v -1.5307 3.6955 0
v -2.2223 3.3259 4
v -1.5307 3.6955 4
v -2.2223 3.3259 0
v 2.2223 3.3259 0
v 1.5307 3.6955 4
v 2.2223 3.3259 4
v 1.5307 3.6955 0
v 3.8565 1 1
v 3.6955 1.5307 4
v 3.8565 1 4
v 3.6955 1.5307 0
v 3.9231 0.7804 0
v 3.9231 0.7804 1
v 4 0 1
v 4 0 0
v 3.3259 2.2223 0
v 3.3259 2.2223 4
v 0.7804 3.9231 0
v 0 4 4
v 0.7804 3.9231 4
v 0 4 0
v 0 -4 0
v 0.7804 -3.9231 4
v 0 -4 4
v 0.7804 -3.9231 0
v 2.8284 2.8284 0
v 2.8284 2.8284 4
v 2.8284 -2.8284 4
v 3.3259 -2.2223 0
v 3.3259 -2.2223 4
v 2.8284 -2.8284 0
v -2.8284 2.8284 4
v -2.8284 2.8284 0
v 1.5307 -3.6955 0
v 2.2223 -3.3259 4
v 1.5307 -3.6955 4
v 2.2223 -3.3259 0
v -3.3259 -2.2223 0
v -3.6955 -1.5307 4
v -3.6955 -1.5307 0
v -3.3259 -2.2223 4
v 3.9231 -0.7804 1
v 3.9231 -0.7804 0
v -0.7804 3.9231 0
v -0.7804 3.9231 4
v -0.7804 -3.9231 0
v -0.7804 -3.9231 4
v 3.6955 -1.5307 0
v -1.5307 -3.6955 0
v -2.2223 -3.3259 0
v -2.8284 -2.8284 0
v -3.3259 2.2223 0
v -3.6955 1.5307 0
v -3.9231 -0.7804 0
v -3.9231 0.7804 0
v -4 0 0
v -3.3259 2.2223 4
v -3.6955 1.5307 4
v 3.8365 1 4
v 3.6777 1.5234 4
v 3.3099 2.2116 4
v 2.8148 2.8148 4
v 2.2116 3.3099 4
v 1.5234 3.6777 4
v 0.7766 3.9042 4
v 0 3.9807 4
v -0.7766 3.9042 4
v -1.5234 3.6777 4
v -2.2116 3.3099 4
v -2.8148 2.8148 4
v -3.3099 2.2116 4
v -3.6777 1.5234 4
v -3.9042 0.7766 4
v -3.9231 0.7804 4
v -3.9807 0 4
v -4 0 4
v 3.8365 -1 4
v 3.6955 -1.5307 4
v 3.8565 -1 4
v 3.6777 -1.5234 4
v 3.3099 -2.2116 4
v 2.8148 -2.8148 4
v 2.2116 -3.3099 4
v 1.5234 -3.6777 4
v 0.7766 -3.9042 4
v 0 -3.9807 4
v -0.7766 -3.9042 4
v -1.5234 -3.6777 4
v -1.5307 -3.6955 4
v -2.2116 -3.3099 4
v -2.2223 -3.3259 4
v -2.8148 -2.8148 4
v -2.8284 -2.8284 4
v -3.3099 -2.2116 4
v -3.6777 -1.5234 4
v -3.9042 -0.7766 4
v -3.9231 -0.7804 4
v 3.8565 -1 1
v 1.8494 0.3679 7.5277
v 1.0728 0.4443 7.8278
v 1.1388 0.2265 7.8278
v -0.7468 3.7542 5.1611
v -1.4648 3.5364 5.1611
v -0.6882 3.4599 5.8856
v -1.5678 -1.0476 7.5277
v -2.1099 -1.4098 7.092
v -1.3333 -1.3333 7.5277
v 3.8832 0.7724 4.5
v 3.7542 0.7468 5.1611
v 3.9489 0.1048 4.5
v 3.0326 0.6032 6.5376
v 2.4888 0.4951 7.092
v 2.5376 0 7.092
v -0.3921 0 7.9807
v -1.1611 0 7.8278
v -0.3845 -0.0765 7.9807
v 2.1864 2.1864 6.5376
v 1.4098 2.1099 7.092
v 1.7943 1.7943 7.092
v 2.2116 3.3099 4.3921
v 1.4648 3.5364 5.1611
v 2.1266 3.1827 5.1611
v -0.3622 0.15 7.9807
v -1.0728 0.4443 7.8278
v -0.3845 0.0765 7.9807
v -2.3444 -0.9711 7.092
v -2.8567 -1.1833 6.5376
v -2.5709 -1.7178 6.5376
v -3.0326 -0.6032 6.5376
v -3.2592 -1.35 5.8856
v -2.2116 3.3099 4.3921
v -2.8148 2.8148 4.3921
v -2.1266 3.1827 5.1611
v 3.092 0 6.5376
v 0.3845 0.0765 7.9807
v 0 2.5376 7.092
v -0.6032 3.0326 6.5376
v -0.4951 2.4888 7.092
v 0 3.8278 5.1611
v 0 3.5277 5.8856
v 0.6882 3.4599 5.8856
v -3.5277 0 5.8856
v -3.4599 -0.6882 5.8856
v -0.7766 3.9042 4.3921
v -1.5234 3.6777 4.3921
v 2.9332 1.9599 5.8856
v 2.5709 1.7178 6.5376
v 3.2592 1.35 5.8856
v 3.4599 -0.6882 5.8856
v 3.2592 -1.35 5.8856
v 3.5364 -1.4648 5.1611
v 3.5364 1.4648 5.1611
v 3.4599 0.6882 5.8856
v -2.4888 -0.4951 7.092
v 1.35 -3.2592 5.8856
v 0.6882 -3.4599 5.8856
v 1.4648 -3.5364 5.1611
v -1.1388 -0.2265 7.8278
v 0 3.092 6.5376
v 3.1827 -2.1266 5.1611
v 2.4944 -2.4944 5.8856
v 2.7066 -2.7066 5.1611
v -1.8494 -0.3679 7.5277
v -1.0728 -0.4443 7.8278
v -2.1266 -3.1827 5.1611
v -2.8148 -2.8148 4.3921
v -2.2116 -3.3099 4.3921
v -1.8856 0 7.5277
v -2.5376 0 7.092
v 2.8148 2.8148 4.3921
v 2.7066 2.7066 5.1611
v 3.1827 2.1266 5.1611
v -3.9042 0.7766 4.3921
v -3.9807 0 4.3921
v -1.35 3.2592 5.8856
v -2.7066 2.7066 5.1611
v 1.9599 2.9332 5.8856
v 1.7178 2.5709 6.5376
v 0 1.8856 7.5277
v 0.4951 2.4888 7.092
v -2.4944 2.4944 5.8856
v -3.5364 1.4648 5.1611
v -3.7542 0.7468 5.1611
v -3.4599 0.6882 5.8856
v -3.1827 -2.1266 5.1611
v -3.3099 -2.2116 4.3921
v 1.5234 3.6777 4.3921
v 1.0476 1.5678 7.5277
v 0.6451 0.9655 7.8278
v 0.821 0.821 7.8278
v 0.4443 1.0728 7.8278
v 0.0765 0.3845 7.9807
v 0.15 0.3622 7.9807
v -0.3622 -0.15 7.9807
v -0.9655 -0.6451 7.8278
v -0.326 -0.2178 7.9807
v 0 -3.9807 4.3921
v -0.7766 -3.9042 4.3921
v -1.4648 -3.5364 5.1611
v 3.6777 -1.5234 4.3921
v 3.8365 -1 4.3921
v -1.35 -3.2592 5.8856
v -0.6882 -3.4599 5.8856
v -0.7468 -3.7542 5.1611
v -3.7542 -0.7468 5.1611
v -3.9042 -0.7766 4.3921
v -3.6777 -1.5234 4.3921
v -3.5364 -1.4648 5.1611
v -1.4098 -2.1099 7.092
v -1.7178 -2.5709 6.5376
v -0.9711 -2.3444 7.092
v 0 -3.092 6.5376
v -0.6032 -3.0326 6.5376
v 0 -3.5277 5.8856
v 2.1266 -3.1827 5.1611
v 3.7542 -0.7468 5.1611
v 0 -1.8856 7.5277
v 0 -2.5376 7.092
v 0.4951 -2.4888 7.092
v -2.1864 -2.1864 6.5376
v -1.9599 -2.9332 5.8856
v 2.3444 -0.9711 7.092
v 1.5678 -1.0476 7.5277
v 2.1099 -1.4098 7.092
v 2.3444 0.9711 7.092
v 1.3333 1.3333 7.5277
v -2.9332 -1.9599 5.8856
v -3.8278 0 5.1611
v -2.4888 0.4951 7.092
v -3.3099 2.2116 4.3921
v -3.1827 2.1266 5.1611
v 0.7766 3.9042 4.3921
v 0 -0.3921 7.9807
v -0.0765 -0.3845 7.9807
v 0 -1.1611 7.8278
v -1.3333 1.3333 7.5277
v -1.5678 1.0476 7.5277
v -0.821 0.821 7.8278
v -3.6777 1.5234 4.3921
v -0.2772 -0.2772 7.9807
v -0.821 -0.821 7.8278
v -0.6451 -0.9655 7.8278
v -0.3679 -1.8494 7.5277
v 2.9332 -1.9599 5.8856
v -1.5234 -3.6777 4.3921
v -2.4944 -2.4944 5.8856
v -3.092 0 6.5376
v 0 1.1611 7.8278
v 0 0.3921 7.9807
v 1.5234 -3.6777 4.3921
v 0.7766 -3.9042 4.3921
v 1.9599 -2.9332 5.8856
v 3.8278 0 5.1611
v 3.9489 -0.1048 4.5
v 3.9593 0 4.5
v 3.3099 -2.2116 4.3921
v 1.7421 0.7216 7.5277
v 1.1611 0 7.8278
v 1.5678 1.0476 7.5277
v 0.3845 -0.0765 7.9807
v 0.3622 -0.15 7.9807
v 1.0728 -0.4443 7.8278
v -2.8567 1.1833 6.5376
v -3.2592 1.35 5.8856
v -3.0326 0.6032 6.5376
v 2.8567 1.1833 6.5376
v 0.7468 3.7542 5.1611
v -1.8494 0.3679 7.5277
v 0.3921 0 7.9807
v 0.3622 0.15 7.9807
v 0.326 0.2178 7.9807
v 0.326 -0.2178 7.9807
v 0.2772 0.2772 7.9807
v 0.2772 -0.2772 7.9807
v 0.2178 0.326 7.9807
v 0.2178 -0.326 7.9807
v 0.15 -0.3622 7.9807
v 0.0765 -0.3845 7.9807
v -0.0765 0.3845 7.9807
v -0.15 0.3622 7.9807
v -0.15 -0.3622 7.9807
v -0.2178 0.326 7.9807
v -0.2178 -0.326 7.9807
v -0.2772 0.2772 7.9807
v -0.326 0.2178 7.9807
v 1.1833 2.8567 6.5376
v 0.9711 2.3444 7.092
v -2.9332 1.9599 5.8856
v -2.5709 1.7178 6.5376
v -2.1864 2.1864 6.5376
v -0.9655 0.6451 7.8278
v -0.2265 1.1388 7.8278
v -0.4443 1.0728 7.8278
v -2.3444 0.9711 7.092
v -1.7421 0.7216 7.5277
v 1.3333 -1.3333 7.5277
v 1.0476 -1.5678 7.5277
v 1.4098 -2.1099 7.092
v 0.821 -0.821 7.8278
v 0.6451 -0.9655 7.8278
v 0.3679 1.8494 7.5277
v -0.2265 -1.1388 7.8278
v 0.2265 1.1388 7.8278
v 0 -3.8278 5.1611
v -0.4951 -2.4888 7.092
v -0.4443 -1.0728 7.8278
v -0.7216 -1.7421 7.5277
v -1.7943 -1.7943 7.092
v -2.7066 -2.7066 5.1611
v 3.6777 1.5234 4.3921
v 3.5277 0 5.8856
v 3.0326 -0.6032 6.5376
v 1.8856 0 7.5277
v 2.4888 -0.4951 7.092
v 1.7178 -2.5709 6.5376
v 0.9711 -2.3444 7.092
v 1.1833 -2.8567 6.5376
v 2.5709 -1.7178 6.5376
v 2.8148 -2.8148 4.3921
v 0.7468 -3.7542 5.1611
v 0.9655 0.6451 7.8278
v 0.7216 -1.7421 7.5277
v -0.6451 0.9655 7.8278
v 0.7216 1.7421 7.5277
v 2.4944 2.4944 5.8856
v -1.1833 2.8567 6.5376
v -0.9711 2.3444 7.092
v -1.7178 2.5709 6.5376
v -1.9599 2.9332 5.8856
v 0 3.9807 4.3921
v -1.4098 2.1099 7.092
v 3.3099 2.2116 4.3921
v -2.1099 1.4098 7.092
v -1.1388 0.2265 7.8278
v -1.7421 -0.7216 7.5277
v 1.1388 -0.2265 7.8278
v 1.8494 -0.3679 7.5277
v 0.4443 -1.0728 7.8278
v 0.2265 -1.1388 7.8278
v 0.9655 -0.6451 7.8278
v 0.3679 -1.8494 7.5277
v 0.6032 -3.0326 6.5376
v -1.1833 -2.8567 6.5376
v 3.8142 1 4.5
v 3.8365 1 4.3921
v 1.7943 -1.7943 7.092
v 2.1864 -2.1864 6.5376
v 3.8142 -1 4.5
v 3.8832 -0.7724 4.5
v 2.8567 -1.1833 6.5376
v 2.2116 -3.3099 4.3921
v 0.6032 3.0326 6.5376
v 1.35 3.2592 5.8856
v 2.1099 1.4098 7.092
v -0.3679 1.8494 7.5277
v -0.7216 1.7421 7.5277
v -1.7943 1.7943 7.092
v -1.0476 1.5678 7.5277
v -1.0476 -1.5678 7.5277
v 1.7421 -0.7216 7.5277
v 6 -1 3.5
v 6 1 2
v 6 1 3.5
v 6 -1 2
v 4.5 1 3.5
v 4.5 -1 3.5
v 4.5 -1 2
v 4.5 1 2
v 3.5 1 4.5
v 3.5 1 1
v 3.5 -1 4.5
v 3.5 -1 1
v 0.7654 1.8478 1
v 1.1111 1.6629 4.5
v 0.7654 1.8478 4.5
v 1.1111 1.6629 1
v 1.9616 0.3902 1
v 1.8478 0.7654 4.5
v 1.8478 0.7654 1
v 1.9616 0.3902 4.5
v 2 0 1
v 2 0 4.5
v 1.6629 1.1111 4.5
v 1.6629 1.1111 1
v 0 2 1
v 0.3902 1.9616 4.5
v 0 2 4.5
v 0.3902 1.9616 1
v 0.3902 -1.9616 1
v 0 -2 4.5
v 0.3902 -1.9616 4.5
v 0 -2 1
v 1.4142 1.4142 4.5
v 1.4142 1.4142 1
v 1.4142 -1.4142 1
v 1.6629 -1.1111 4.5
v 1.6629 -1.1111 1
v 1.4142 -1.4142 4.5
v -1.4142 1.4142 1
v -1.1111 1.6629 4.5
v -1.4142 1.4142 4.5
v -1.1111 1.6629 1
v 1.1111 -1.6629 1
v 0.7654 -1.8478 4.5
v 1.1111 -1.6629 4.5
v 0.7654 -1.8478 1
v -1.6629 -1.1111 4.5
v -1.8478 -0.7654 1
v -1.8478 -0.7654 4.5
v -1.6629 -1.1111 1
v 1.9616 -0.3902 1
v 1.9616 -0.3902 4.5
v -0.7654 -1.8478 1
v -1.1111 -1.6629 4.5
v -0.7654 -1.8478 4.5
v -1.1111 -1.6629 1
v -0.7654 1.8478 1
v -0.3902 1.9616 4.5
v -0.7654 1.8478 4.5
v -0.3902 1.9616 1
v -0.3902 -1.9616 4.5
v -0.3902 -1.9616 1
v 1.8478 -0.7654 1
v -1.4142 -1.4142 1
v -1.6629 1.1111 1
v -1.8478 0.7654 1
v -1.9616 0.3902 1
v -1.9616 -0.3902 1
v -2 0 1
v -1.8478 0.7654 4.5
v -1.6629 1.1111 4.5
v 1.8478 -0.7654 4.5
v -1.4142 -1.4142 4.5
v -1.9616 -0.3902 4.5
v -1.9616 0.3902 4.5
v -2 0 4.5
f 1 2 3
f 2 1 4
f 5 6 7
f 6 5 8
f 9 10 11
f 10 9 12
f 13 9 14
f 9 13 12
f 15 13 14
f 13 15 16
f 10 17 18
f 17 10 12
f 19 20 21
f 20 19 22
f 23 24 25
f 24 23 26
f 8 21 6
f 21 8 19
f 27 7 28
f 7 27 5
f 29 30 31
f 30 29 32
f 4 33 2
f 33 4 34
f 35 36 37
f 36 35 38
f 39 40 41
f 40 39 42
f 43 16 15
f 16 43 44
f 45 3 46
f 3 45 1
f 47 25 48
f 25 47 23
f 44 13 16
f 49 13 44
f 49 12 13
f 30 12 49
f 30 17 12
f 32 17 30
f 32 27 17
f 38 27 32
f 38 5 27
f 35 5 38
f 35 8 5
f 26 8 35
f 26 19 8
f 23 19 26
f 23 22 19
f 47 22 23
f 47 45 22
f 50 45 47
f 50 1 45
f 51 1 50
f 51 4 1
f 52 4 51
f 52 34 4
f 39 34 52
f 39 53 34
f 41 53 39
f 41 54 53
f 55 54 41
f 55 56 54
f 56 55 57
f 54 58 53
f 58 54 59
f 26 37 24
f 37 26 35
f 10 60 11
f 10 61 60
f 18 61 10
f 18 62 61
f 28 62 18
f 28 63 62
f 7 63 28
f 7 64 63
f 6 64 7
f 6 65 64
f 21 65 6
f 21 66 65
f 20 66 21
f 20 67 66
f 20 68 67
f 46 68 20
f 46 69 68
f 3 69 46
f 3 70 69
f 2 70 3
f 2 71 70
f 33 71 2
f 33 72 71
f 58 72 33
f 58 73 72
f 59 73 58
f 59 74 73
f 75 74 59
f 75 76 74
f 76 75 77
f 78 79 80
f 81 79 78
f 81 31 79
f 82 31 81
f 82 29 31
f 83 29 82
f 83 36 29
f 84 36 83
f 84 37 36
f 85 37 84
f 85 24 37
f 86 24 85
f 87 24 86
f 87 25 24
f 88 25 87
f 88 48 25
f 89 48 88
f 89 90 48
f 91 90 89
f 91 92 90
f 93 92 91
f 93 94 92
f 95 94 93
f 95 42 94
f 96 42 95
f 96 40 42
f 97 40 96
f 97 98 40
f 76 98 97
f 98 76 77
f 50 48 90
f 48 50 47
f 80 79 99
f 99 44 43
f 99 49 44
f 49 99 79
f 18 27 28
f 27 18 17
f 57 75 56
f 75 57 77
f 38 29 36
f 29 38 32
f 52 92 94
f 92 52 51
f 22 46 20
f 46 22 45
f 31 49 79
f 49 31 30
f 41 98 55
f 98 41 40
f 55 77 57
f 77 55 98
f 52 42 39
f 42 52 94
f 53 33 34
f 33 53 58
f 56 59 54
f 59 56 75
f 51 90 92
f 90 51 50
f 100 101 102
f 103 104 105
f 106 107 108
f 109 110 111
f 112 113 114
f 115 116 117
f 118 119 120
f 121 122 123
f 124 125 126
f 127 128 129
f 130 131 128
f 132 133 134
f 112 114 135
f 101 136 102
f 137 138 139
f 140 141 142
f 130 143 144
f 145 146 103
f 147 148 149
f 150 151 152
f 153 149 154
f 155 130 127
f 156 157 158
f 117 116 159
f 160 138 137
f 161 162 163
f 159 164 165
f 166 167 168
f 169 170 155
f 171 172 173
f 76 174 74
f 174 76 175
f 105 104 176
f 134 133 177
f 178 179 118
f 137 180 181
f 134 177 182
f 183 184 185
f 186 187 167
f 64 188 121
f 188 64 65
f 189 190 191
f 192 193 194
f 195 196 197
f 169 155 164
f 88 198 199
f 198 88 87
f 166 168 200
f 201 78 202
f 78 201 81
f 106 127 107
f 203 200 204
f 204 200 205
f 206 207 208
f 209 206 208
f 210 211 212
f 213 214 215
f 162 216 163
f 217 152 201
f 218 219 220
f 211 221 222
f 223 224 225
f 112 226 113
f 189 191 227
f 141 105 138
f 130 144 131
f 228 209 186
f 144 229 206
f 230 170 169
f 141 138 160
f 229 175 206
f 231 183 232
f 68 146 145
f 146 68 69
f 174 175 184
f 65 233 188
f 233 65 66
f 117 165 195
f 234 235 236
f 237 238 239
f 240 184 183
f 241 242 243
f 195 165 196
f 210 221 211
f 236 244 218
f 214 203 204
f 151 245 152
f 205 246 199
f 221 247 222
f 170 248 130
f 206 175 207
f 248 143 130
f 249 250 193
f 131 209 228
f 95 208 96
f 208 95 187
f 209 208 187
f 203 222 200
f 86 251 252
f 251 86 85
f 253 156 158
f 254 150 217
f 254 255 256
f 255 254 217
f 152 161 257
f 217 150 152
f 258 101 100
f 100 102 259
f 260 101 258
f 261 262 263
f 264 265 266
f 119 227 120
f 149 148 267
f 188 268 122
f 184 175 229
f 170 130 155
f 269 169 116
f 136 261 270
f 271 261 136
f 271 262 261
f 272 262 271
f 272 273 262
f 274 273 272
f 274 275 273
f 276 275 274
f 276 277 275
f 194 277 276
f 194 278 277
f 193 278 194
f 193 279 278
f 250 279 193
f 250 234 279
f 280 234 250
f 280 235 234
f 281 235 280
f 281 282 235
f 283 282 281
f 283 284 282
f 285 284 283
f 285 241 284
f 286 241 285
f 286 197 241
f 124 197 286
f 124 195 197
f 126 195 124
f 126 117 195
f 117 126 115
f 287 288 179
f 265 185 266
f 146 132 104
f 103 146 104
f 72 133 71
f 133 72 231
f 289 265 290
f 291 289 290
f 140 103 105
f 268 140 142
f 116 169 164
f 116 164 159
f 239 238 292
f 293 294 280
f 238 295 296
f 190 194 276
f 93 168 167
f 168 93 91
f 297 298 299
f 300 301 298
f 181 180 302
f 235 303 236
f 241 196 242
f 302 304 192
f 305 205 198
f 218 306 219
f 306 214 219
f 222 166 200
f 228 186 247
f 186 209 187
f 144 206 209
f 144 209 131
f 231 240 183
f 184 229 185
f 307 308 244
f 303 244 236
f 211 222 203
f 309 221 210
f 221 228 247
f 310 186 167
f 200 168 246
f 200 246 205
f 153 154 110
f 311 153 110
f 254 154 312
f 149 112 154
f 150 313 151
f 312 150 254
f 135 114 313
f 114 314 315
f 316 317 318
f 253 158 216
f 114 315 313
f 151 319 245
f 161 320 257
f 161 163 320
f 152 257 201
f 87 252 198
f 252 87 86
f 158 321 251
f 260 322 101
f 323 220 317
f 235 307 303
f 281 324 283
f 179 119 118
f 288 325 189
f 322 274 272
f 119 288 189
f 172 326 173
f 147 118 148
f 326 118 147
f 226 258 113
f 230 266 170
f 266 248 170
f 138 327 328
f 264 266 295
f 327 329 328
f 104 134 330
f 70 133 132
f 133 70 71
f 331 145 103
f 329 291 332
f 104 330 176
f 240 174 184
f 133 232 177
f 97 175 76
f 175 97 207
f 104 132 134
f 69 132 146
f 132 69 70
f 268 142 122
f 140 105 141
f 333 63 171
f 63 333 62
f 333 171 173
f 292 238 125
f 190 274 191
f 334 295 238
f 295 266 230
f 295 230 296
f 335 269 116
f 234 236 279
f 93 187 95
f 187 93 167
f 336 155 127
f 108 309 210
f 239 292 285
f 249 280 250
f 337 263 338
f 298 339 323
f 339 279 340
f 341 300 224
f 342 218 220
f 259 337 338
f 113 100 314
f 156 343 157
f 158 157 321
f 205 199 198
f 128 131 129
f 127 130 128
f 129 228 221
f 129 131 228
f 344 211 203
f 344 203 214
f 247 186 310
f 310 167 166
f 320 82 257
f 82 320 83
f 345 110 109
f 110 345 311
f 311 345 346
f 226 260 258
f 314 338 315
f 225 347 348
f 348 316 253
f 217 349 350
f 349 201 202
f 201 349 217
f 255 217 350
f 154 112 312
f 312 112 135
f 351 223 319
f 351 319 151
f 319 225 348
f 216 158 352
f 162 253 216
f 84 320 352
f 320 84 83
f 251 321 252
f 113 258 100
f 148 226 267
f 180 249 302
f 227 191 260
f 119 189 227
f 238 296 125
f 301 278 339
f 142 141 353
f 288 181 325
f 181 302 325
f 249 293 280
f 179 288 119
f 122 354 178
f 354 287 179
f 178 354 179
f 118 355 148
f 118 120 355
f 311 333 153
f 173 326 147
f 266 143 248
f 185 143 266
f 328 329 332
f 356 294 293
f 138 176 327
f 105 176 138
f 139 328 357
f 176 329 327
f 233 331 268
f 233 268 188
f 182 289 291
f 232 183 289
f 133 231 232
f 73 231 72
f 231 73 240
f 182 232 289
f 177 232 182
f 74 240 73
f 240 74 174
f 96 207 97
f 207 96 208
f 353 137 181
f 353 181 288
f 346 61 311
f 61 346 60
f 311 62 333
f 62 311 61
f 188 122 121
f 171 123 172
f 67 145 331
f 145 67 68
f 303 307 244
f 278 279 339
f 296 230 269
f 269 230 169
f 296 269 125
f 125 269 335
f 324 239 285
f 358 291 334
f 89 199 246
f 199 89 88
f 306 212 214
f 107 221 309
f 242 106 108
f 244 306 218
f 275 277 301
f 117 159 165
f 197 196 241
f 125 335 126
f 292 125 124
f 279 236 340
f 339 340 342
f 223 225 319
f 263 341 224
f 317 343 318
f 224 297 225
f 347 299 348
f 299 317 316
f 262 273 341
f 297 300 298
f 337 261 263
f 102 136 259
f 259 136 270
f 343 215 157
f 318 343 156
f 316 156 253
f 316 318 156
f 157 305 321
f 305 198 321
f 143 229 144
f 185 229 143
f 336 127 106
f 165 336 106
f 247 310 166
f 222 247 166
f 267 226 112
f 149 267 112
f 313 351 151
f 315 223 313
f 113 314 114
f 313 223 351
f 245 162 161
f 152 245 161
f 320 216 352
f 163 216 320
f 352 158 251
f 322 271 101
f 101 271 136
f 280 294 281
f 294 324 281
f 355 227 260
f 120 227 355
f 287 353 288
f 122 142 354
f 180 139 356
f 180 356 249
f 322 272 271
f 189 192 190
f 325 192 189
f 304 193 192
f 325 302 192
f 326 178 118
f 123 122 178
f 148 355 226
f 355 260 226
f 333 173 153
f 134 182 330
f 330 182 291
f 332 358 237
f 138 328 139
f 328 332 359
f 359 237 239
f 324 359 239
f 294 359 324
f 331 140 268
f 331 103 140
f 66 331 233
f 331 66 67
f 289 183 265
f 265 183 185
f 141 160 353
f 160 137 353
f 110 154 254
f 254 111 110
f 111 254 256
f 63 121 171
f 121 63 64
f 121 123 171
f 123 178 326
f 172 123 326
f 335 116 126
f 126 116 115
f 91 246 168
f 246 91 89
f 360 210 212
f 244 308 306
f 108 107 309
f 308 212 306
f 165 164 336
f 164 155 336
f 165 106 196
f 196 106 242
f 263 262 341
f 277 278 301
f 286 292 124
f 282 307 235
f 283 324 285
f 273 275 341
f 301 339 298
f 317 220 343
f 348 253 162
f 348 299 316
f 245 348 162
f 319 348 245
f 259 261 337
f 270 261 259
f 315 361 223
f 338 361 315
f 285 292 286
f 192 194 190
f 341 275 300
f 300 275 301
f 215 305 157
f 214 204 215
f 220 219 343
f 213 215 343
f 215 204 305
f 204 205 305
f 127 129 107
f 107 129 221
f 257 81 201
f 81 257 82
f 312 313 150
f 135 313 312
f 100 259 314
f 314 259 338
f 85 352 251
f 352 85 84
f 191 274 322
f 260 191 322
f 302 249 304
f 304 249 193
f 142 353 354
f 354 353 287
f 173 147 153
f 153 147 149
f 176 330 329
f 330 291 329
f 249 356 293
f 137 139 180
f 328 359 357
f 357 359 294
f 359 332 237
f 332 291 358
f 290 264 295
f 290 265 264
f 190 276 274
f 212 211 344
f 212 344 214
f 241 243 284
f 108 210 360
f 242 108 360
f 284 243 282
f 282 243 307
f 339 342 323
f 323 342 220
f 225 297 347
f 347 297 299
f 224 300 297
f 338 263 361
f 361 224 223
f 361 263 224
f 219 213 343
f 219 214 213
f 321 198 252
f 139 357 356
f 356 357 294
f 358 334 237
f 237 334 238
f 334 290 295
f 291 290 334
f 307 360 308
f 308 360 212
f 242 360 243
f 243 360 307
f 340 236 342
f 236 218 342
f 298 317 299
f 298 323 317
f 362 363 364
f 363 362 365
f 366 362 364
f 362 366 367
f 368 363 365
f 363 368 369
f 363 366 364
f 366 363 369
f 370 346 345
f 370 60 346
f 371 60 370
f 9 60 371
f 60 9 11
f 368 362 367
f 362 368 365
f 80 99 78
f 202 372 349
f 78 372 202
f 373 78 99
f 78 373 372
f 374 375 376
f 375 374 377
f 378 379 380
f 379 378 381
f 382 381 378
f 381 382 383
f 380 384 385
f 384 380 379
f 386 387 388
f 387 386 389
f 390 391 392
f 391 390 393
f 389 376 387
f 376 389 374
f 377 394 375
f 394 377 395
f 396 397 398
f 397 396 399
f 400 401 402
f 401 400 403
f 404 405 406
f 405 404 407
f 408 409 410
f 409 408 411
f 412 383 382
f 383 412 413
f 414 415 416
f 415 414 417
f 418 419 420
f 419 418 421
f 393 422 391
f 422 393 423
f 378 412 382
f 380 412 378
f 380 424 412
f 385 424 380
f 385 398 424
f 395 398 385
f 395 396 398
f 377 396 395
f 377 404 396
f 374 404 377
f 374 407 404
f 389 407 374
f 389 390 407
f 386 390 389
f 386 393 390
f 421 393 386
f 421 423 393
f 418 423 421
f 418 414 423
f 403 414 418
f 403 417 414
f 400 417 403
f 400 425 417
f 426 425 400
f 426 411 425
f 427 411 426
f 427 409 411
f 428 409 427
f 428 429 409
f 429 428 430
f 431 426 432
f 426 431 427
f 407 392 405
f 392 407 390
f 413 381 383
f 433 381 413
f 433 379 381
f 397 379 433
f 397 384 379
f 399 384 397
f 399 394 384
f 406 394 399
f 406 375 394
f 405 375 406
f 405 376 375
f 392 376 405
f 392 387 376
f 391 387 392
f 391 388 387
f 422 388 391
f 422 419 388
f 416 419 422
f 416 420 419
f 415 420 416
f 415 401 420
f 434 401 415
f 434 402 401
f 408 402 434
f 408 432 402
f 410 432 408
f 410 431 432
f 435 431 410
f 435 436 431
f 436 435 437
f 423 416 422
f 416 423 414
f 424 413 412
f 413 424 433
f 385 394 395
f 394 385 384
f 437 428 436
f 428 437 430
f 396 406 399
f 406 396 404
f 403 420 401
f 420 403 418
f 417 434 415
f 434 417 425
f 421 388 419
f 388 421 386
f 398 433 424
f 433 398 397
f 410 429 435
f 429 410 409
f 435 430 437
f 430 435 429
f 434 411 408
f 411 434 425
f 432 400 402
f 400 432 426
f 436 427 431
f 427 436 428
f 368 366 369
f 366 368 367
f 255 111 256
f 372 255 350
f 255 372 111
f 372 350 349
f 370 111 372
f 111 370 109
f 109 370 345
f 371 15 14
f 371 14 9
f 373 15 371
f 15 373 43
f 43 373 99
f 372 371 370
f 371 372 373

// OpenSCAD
// TAMPER-EVIDENT TPU SCREW CAPS
// Print: TPU 95A 0.20mm (flex, slightly malleable to show tampering)
// 4 caps per radar unit × 5 units = 20 caps total
// Print time: ~15 sec per cap in TPU
//
// Each cap clicks onto an M3 screw. Tampering = visible deformation.

/* [Cap Geometry] */
CAP_DIA = 8;            // mm outer diameter
CAP_HEIGHT = 4;         // mm height
SOCKET_DIA = 4;         // mm hex socket inside (snap-fit on M3)
DOME_HEIGHT = 1.5;      // mm top dome

$fn = 32;

module tamper_cap() {
    difference() {
        union() {
            // Cylindrical body
            cylinder(h=CAP_HEIGHT, d=CAP_DIA);
            // Top dome
            translate([0, 0, CAP_HEIGHT])
                sphere(d=CAP_DIA);
            // Tab (anti-rotation feature)
            translate([CAP_DIA/2, -1, CAP_HEIGHT/2])
                cube([2, 2, 1.5]);
        }
        // Snap-fit socket
        translate([0, 0, CAP_HEIGHT - 3])
            cylinder(h=3.5, d=SOCKET_DIA);
        // Snap-fit slit for easier fitting
        translate([CAP_DIA/2 - 0.5, -1, CAP_HEIGHT - 3])
            cube([1, 2, 3.5]);
    }
}

tamper_cap();
